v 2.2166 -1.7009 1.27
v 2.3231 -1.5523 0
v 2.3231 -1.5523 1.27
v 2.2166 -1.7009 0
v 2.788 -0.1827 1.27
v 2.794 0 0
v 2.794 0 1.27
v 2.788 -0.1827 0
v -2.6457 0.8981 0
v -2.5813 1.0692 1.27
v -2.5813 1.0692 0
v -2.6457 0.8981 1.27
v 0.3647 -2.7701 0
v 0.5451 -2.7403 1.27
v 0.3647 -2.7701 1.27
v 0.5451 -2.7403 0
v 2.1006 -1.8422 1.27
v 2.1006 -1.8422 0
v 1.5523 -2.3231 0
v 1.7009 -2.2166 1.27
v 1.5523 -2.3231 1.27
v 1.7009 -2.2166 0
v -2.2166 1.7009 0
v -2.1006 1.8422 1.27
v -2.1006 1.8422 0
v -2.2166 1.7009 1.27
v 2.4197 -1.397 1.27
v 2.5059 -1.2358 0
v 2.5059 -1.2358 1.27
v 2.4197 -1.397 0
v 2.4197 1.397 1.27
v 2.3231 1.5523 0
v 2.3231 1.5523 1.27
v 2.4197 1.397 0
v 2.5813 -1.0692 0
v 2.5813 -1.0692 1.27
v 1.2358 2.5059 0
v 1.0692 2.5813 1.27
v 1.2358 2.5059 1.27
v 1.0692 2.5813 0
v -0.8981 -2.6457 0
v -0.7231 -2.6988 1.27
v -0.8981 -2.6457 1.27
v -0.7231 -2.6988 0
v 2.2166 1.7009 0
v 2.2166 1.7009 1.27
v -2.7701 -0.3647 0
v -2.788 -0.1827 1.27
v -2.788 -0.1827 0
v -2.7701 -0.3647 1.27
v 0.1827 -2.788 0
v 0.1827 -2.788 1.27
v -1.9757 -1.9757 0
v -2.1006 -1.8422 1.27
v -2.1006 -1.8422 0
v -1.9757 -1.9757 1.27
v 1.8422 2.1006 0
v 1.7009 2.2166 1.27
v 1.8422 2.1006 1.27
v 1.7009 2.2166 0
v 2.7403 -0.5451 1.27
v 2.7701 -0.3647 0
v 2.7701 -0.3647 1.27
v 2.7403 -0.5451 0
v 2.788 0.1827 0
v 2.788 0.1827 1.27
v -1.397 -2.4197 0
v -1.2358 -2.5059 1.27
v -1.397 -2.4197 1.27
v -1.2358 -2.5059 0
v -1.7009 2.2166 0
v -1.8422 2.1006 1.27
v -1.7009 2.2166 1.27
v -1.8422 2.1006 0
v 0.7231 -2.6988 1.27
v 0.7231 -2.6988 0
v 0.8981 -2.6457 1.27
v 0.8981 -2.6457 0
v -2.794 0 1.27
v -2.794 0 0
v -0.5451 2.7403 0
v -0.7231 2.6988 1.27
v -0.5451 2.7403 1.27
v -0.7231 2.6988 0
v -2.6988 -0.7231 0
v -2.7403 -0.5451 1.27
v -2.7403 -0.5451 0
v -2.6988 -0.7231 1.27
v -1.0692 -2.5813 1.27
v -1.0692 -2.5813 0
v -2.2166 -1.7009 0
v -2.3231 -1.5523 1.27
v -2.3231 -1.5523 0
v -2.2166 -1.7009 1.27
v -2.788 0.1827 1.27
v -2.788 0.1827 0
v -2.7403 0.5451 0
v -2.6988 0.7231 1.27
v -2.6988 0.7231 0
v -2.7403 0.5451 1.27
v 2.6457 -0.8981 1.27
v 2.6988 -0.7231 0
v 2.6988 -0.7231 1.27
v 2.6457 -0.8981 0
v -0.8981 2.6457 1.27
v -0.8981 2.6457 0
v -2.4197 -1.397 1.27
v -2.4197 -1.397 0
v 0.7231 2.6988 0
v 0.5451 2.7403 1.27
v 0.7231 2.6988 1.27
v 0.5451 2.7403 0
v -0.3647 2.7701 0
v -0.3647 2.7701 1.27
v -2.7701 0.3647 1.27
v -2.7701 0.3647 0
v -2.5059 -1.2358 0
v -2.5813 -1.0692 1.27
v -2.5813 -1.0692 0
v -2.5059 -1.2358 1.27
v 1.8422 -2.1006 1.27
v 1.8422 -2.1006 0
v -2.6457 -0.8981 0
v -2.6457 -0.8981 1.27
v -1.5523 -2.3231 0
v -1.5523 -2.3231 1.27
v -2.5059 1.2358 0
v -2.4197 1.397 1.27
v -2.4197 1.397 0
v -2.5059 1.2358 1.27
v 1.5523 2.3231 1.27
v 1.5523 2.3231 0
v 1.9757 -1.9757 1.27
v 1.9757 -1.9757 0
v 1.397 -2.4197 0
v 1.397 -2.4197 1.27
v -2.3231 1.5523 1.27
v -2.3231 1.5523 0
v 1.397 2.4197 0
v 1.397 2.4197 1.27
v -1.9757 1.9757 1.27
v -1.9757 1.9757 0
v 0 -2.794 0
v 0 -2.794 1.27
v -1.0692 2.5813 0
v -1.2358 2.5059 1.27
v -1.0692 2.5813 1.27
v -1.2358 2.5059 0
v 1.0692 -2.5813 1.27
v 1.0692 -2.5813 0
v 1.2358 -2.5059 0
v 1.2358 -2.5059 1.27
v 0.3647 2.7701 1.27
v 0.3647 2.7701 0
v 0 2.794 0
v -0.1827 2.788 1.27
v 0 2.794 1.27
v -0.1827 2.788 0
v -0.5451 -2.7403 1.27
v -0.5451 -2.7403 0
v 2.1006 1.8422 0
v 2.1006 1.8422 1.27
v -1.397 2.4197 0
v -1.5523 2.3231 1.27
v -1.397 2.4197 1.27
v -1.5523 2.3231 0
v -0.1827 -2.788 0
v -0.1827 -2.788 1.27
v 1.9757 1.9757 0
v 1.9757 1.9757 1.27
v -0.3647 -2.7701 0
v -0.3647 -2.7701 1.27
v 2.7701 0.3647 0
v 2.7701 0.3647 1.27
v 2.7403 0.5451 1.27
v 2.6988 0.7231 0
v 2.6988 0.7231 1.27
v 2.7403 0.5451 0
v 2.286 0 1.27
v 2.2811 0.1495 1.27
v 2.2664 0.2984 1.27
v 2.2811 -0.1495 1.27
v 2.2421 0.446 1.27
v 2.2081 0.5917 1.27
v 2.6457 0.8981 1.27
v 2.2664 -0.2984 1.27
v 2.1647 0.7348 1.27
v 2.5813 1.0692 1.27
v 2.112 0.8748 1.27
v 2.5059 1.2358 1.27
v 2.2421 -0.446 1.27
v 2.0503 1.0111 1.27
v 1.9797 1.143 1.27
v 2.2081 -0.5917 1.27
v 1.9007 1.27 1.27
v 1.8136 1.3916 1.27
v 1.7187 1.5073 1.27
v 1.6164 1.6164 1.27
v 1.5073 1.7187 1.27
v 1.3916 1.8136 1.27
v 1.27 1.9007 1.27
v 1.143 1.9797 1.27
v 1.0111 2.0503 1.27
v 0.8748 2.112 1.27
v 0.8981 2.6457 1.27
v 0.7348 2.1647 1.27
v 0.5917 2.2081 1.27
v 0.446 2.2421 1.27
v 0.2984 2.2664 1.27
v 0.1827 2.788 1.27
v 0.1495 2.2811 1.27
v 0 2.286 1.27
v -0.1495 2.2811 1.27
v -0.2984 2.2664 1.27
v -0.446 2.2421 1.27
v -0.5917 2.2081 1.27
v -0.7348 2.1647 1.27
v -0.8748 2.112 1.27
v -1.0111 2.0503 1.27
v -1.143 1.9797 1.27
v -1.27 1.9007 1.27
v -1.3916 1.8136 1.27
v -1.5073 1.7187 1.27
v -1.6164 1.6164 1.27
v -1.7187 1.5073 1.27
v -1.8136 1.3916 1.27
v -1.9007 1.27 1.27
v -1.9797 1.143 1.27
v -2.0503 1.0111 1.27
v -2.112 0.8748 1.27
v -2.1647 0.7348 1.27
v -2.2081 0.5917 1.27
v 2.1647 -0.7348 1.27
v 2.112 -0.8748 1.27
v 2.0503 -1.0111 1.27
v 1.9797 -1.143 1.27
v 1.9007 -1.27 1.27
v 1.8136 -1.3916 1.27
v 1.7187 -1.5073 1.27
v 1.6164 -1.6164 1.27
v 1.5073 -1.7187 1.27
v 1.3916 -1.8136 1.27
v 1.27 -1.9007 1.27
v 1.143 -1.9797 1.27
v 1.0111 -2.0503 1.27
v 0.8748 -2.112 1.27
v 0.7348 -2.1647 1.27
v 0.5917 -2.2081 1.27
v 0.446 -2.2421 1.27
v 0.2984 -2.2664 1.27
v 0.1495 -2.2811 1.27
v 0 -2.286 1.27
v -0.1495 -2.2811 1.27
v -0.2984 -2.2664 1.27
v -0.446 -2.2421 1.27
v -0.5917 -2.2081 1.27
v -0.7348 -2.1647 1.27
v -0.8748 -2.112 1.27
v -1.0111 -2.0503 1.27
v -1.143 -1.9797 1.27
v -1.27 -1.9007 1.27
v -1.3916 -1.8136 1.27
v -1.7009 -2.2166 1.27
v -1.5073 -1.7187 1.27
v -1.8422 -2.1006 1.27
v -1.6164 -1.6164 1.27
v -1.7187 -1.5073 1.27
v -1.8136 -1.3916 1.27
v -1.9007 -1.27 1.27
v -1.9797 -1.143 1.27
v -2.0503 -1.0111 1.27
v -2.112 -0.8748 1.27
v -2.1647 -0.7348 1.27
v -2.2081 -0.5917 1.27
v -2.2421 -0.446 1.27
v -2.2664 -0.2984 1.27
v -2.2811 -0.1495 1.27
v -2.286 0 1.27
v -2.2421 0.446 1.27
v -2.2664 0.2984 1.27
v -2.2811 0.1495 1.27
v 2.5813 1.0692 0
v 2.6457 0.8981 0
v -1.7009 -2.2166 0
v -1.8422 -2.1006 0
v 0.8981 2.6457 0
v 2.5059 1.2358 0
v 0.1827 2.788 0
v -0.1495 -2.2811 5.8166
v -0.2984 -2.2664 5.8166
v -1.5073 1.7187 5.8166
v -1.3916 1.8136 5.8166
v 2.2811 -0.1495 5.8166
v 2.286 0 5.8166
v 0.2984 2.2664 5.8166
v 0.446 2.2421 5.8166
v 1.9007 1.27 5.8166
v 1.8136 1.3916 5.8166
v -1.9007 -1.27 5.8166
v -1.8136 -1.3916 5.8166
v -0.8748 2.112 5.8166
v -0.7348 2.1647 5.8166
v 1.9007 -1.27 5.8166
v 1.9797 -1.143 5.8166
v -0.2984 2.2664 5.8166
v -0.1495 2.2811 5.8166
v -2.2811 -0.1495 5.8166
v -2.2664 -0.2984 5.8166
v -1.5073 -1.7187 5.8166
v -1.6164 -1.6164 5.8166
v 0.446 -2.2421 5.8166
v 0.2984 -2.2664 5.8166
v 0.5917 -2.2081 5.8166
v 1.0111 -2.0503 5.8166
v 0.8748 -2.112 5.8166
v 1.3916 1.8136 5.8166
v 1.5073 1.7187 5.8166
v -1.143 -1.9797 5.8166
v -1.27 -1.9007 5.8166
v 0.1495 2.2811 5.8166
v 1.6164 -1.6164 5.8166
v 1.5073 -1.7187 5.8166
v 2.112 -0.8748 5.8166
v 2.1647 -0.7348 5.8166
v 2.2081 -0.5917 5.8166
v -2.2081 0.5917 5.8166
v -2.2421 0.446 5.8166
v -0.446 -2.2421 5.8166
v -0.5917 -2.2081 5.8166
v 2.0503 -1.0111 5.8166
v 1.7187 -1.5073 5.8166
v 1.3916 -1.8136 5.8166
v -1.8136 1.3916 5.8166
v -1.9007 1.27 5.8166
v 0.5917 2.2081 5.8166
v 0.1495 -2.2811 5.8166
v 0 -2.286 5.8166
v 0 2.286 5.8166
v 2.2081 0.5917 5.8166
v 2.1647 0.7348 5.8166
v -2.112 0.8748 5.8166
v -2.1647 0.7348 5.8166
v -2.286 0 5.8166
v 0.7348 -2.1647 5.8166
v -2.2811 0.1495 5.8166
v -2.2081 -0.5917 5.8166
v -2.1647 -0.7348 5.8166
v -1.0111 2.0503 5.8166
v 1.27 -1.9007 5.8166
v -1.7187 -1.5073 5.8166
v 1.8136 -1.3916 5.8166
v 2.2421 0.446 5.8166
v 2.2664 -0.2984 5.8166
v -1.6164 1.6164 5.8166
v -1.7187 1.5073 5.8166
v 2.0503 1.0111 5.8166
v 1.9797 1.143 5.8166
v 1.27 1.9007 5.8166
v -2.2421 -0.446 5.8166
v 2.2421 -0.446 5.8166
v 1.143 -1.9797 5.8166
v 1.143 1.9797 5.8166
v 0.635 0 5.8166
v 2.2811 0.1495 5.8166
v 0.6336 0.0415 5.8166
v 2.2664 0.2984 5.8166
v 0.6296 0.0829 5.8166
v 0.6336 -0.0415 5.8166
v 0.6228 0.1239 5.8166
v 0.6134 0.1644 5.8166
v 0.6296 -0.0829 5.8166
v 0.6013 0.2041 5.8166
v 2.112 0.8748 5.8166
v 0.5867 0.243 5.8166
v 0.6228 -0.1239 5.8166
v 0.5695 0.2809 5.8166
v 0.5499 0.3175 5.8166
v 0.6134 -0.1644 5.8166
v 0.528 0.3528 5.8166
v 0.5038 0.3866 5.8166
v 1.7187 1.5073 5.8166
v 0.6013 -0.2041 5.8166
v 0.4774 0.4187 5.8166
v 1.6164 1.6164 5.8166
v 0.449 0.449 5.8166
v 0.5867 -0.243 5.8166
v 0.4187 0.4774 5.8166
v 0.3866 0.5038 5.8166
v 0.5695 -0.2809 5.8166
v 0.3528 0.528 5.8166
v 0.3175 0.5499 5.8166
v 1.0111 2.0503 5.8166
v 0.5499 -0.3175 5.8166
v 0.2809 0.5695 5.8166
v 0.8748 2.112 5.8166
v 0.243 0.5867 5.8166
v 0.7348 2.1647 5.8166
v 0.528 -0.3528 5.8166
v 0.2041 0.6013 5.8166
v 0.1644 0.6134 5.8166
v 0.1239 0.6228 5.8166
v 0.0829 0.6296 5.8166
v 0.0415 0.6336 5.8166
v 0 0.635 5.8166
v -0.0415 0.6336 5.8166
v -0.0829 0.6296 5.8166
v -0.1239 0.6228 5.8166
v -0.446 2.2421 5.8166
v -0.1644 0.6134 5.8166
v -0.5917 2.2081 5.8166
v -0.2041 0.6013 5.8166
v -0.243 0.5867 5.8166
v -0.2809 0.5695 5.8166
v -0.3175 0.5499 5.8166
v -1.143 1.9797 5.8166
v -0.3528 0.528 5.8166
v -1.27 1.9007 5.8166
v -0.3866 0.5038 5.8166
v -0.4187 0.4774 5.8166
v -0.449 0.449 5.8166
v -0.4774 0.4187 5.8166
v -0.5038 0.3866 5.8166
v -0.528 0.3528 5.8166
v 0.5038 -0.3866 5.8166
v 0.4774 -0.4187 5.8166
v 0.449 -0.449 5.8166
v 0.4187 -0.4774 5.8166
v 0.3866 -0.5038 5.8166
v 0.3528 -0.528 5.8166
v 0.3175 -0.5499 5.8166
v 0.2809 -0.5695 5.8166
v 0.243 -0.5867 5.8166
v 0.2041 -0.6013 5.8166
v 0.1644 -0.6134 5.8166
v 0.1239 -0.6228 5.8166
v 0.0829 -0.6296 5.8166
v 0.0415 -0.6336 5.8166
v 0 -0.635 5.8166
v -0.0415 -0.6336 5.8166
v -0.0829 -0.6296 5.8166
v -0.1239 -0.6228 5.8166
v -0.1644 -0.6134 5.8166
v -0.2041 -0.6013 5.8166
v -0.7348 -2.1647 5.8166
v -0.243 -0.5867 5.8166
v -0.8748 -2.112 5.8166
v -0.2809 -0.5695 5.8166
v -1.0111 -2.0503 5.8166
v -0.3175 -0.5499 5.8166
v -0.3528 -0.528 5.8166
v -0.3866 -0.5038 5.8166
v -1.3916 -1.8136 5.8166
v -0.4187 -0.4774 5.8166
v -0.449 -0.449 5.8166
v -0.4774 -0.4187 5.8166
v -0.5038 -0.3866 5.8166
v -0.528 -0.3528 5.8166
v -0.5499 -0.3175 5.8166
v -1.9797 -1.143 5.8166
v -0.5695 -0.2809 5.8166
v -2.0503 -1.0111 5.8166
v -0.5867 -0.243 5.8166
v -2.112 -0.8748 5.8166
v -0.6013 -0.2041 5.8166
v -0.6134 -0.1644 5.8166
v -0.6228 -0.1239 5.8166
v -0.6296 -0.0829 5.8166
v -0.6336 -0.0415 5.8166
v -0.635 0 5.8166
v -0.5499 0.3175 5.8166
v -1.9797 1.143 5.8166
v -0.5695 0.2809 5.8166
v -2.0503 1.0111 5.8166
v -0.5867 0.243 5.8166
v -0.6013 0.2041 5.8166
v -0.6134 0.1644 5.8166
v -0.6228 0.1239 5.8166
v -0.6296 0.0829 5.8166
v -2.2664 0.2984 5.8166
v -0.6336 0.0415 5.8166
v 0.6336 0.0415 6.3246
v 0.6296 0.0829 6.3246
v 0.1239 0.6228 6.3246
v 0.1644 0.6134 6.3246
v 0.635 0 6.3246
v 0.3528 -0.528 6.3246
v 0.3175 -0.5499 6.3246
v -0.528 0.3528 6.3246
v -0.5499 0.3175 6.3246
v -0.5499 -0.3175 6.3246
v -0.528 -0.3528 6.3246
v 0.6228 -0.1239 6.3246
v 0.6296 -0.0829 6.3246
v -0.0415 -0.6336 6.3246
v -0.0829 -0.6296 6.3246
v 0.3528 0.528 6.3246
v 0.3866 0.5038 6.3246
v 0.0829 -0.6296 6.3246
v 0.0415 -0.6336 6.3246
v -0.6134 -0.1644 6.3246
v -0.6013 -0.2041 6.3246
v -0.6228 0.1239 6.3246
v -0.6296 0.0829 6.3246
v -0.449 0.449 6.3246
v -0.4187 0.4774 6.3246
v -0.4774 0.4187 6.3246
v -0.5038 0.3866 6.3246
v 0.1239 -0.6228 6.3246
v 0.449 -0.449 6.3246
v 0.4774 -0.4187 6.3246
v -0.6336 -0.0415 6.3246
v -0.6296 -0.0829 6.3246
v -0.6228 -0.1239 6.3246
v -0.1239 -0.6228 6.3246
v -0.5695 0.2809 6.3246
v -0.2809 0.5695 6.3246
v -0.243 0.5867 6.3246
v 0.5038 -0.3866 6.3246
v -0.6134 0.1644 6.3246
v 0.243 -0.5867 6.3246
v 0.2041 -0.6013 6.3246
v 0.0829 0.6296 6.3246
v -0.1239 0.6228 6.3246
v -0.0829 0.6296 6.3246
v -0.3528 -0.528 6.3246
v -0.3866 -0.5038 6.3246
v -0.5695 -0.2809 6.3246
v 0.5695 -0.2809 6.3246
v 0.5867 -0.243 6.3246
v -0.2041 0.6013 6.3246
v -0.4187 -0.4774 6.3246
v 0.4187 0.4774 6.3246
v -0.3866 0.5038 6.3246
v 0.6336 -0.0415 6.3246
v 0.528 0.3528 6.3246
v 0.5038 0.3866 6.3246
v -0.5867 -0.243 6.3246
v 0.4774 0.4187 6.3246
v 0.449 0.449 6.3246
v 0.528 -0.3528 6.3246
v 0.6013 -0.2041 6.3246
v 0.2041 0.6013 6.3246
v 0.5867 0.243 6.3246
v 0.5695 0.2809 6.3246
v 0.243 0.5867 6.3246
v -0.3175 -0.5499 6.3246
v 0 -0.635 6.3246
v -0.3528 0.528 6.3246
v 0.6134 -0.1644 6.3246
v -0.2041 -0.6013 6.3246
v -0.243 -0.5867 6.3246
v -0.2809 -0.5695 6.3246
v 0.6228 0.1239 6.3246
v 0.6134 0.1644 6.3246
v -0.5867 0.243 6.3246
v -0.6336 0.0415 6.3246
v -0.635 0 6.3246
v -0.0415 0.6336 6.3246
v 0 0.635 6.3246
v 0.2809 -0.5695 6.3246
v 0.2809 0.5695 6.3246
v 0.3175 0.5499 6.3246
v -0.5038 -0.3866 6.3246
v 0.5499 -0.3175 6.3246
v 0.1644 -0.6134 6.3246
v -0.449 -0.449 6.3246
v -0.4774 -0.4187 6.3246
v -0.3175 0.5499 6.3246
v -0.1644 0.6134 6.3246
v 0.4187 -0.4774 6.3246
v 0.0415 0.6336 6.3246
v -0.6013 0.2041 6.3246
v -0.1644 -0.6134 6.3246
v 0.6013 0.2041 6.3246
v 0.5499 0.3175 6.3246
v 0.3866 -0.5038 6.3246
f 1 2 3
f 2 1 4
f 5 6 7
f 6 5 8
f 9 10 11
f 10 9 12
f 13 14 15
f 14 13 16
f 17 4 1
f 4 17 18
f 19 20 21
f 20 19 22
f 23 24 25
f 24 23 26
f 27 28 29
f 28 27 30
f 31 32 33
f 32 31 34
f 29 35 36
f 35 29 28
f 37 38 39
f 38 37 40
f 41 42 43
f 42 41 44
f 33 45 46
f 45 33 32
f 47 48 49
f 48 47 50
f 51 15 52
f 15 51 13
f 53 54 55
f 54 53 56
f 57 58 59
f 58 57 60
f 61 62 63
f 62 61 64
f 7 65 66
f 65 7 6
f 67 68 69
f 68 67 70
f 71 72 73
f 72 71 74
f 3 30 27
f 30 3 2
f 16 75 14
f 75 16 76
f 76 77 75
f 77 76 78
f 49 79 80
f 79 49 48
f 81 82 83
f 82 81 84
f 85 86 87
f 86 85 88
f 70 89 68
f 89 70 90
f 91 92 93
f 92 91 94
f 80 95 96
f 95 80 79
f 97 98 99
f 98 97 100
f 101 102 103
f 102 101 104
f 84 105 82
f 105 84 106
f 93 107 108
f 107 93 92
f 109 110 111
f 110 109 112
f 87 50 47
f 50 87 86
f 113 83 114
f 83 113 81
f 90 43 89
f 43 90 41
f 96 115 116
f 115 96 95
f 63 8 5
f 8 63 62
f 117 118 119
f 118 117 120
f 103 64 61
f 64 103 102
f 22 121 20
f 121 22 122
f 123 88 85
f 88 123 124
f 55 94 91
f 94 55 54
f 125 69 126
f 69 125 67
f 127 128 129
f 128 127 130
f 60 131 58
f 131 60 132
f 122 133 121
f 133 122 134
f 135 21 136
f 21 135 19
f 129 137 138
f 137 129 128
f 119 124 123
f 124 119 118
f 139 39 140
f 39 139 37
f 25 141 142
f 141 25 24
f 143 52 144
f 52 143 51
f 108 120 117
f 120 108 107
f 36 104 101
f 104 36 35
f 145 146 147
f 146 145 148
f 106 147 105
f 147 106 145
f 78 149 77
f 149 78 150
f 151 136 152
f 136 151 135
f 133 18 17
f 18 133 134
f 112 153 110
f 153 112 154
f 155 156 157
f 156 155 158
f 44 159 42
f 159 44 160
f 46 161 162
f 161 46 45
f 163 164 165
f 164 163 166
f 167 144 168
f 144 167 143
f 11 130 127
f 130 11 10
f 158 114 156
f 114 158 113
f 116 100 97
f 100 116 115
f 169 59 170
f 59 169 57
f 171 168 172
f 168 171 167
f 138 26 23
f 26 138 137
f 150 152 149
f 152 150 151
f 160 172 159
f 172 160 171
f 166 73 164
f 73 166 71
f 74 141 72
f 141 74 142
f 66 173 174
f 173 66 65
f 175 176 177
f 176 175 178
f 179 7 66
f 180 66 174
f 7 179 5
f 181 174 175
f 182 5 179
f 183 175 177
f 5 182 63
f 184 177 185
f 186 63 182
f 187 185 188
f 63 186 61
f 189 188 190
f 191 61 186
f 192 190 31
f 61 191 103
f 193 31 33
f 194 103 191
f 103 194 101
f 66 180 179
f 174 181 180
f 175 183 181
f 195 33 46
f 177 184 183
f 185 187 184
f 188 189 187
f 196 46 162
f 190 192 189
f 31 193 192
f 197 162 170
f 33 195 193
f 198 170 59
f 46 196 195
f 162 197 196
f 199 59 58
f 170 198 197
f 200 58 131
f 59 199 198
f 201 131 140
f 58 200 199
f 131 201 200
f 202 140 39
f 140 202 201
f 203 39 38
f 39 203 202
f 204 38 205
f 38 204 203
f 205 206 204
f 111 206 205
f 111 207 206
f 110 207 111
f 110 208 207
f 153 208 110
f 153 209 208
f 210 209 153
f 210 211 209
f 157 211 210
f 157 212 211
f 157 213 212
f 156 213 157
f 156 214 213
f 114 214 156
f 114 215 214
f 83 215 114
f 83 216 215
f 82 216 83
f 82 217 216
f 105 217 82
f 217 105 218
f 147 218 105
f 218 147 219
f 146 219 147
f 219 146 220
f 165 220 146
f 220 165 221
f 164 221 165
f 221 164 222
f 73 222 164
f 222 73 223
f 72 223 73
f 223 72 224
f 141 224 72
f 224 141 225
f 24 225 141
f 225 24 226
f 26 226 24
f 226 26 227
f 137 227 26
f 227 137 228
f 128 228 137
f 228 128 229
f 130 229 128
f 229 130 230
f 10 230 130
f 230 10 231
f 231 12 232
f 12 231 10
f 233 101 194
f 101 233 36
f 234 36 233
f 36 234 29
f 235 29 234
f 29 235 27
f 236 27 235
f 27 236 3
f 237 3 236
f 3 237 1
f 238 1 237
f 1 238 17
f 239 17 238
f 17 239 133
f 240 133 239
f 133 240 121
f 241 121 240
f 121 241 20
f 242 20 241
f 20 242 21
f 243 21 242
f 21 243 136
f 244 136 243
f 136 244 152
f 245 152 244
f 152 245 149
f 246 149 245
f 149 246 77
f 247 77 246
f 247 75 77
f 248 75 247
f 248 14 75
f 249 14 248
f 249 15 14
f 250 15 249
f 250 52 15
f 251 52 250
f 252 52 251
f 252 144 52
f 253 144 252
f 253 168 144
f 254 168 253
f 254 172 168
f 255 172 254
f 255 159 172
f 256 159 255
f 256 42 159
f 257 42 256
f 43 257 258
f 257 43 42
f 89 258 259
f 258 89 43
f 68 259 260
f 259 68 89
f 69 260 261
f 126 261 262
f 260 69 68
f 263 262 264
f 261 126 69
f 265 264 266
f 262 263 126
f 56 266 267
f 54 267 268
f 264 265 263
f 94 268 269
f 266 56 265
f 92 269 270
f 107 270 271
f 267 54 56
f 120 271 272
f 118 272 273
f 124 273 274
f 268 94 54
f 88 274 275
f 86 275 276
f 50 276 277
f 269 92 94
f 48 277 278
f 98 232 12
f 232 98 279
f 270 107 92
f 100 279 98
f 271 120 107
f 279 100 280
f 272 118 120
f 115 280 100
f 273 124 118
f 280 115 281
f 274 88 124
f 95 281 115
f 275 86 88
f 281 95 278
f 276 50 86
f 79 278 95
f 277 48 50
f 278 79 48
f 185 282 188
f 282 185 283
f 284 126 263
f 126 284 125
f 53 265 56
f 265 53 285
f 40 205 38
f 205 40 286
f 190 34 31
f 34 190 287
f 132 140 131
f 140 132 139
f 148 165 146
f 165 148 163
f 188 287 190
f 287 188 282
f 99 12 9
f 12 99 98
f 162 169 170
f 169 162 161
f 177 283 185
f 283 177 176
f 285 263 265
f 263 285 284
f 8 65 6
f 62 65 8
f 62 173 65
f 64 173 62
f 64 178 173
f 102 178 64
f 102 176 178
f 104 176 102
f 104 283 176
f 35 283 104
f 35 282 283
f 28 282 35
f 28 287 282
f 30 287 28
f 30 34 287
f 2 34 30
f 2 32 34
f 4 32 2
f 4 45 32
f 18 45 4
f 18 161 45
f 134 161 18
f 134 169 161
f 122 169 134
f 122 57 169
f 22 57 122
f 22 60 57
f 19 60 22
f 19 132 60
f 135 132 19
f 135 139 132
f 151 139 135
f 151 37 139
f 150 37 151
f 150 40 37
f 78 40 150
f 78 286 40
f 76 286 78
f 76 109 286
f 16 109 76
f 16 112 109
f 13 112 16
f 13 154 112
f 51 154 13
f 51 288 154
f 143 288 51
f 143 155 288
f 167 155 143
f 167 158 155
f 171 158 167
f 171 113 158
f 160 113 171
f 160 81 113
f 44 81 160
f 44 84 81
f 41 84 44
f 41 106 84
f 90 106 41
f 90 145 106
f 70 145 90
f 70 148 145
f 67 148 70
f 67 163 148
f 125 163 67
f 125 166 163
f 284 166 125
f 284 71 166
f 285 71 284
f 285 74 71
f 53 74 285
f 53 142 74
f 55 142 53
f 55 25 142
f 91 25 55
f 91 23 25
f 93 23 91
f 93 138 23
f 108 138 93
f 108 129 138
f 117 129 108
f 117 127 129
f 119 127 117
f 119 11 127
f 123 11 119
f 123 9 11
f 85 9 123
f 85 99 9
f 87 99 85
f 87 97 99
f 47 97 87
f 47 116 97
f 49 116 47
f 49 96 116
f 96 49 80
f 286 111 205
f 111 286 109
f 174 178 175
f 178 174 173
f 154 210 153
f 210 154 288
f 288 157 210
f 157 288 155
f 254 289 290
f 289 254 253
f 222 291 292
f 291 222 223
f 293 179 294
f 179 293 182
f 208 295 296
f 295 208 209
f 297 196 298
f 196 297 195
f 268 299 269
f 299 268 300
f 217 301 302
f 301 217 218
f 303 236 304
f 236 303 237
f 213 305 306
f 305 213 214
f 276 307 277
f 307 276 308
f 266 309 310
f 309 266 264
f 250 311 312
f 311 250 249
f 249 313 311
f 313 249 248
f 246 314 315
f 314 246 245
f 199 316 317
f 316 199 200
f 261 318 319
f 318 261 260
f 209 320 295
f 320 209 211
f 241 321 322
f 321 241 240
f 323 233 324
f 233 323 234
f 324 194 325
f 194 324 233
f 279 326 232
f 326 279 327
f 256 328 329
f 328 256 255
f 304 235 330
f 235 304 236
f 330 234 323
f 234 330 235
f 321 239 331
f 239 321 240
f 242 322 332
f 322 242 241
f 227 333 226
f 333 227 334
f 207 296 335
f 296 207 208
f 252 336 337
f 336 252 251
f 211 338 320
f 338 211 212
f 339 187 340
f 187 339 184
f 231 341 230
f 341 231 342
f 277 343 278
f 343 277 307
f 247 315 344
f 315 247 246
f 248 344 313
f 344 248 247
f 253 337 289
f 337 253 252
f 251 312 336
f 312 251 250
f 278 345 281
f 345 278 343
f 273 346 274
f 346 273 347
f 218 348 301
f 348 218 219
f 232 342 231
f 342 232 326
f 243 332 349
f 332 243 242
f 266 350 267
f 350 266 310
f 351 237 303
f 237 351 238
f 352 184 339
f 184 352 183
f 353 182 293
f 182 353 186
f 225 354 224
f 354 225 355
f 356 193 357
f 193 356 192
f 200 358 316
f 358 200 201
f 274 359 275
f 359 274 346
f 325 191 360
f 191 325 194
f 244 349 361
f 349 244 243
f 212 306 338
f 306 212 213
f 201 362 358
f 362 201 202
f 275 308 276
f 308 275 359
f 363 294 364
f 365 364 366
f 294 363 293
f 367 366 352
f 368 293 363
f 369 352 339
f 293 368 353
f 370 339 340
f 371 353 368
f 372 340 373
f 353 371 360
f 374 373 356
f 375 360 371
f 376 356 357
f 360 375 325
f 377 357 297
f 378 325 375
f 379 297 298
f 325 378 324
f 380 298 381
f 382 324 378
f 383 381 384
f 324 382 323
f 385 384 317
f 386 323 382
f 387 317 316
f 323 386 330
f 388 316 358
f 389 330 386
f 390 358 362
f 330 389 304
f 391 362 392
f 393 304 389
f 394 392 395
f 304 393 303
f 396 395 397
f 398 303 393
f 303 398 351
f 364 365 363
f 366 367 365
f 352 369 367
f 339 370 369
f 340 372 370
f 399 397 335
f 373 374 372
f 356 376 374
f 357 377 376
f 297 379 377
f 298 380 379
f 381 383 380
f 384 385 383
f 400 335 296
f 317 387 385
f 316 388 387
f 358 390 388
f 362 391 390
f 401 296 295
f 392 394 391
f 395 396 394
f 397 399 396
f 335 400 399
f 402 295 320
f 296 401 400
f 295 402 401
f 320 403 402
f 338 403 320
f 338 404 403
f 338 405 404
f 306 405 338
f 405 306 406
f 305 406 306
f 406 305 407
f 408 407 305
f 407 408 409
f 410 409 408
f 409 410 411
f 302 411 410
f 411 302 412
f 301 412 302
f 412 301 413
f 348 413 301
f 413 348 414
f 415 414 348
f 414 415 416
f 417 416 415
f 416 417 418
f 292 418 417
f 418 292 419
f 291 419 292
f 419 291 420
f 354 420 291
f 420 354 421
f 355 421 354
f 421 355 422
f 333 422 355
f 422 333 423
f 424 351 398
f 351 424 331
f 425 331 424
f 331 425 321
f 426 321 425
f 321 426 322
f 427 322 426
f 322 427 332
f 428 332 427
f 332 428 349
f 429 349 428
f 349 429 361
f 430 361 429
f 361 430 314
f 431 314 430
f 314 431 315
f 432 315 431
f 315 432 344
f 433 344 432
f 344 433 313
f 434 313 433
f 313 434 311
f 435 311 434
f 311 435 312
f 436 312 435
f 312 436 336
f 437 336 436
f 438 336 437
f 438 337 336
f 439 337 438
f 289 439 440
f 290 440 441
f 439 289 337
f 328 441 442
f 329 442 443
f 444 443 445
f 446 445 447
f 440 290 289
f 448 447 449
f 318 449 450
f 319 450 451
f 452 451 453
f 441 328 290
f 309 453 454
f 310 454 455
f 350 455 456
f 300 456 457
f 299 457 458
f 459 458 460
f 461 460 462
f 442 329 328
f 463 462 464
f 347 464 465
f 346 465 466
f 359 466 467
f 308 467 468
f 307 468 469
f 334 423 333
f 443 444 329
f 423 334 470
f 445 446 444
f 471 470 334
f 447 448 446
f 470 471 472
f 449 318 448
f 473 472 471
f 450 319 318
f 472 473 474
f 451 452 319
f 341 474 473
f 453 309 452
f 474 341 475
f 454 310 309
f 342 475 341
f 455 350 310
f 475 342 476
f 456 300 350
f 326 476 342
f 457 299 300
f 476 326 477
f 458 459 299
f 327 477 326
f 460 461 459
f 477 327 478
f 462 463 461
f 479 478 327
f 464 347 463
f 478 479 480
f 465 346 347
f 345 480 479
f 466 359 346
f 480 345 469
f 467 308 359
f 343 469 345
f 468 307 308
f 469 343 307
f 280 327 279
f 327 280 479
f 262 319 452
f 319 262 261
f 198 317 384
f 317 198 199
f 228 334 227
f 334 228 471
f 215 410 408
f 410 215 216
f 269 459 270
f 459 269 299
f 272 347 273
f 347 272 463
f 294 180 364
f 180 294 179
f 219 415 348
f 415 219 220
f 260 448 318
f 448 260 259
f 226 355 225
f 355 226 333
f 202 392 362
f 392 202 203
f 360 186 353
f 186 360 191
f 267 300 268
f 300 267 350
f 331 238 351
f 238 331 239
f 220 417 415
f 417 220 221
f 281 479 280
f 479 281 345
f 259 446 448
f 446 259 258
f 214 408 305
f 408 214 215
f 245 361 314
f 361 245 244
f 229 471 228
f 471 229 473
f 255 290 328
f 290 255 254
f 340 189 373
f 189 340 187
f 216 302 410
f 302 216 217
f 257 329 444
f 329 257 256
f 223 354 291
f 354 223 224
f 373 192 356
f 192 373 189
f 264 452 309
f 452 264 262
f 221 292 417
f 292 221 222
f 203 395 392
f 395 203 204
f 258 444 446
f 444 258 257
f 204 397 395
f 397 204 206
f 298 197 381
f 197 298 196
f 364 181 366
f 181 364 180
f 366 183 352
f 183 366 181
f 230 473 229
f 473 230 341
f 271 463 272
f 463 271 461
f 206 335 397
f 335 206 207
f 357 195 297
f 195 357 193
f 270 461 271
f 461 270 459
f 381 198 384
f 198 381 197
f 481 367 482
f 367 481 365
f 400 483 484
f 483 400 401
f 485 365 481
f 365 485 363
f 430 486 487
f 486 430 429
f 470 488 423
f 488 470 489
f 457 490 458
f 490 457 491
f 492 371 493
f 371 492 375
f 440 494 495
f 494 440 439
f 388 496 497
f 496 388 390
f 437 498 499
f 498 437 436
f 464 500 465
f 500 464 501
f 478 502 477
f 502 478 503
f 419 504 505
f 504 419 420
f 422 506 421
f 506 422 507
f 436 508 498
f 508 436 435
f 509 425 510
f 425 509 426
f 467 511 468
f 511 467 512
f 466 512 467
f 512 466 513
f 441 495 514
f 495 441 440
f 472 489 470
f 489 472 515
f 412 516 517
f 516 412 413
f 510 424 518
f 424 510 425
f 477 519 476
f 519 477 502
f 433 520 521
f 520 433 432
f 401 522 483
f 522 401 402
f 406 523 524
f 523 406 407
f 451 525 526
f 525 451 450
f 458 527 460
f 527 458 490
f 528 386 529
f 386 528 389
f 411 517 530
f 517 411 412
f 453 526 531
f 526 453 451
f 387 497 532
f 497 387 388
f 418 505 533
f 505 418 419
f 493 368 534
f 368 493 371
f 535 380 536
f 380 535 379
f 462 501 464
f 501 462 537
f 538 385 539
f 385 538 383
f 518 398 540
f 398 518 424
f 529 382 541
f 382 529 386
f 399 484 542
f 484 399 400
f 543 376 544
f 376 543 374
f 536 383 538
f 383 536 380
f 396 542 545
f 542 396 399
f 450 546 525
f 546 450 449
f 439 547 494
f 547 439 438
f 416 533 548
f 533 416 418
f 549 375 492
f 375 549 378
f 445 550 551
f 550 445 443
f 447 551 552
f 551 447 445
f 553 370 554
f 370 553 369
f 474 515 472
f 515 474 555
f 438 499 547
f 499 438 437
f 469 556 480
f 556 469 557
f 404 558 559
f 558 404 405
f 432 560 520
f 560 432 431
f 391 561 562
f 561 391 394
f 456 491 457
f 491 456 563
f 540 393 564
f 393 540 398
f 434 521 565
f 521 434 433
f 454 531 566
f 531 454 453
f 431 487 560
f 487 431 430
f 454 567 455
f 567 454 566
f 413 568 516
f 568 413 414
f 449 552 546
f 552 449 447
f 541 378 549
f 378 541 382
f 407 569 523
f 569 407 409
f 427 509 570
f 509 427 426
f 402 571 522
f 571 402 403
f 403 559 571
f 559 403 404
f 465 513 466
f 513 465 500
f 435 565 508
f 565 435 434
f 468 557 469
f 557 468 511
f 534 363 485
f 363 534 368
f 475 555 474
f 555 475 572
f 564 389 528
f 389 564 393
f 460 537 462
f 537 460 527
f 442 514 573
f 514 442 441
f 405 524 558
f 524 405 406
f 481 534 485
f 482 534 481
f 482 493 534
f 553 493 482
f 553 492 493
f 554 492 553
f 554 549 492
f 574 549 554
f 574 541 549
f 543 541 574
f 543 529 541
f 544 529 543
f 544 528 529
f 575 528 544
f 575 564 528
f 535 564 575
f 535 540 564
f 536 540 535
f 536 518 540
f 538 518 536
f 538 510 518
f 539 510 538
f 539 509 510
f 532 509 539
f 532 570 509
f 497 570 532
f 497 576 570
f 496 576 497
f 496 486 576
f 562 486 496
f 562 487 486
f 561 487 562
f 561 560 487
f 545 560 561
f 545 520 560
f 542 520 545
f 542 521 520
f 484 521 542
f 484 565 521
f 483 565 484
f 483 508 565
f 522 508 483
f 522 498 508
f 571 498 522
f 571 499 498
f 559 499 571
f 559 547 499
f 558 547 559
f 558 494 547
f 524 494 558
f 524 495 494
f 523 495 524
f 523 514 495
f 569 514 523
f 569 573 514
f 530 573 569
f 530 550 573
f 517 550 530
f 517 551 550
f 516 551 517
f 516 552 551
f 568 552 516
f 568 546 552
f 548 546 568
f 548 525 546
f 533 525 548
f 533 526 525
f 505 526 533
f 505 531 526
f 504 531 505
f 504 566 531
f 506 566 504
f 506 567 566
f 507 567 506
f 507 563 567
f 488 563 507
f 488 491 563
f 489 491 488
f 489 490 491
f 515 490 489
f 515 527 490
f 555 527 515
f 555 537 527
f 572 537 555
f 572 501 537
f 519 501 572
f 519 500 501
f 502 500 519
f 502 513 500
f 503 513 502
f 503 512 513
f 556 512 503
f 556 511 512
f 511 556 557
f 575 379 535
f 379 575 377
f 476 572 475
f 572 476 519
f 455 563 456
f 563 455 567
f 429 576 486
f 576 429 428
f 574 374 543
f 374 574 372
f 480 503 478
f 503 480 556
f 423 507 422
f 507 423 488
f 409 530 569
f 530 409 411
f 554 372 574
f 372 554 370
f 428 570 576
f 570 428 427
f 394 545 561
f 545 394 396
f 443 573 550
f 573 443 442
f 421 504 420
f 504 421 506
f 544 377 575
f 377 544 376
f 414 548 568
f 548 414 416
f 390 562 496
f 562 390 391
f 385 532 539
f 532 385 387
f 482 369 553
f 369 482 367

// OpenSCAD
ViewScale = [0.0254, 0.0254, 0.0254];

module cap()
{
    linear_extrude(50)
    circle(220/2, $fn=96);
    translate([0, 0, 49])
    linear_extrude(180)
    circle(180/2, $fn=96);
    translate([0, 0, 229])
    linear_extrude(20)
    circle(50/2, $fn=96);
}

scale(ViewScale)
{
    cap();
}
